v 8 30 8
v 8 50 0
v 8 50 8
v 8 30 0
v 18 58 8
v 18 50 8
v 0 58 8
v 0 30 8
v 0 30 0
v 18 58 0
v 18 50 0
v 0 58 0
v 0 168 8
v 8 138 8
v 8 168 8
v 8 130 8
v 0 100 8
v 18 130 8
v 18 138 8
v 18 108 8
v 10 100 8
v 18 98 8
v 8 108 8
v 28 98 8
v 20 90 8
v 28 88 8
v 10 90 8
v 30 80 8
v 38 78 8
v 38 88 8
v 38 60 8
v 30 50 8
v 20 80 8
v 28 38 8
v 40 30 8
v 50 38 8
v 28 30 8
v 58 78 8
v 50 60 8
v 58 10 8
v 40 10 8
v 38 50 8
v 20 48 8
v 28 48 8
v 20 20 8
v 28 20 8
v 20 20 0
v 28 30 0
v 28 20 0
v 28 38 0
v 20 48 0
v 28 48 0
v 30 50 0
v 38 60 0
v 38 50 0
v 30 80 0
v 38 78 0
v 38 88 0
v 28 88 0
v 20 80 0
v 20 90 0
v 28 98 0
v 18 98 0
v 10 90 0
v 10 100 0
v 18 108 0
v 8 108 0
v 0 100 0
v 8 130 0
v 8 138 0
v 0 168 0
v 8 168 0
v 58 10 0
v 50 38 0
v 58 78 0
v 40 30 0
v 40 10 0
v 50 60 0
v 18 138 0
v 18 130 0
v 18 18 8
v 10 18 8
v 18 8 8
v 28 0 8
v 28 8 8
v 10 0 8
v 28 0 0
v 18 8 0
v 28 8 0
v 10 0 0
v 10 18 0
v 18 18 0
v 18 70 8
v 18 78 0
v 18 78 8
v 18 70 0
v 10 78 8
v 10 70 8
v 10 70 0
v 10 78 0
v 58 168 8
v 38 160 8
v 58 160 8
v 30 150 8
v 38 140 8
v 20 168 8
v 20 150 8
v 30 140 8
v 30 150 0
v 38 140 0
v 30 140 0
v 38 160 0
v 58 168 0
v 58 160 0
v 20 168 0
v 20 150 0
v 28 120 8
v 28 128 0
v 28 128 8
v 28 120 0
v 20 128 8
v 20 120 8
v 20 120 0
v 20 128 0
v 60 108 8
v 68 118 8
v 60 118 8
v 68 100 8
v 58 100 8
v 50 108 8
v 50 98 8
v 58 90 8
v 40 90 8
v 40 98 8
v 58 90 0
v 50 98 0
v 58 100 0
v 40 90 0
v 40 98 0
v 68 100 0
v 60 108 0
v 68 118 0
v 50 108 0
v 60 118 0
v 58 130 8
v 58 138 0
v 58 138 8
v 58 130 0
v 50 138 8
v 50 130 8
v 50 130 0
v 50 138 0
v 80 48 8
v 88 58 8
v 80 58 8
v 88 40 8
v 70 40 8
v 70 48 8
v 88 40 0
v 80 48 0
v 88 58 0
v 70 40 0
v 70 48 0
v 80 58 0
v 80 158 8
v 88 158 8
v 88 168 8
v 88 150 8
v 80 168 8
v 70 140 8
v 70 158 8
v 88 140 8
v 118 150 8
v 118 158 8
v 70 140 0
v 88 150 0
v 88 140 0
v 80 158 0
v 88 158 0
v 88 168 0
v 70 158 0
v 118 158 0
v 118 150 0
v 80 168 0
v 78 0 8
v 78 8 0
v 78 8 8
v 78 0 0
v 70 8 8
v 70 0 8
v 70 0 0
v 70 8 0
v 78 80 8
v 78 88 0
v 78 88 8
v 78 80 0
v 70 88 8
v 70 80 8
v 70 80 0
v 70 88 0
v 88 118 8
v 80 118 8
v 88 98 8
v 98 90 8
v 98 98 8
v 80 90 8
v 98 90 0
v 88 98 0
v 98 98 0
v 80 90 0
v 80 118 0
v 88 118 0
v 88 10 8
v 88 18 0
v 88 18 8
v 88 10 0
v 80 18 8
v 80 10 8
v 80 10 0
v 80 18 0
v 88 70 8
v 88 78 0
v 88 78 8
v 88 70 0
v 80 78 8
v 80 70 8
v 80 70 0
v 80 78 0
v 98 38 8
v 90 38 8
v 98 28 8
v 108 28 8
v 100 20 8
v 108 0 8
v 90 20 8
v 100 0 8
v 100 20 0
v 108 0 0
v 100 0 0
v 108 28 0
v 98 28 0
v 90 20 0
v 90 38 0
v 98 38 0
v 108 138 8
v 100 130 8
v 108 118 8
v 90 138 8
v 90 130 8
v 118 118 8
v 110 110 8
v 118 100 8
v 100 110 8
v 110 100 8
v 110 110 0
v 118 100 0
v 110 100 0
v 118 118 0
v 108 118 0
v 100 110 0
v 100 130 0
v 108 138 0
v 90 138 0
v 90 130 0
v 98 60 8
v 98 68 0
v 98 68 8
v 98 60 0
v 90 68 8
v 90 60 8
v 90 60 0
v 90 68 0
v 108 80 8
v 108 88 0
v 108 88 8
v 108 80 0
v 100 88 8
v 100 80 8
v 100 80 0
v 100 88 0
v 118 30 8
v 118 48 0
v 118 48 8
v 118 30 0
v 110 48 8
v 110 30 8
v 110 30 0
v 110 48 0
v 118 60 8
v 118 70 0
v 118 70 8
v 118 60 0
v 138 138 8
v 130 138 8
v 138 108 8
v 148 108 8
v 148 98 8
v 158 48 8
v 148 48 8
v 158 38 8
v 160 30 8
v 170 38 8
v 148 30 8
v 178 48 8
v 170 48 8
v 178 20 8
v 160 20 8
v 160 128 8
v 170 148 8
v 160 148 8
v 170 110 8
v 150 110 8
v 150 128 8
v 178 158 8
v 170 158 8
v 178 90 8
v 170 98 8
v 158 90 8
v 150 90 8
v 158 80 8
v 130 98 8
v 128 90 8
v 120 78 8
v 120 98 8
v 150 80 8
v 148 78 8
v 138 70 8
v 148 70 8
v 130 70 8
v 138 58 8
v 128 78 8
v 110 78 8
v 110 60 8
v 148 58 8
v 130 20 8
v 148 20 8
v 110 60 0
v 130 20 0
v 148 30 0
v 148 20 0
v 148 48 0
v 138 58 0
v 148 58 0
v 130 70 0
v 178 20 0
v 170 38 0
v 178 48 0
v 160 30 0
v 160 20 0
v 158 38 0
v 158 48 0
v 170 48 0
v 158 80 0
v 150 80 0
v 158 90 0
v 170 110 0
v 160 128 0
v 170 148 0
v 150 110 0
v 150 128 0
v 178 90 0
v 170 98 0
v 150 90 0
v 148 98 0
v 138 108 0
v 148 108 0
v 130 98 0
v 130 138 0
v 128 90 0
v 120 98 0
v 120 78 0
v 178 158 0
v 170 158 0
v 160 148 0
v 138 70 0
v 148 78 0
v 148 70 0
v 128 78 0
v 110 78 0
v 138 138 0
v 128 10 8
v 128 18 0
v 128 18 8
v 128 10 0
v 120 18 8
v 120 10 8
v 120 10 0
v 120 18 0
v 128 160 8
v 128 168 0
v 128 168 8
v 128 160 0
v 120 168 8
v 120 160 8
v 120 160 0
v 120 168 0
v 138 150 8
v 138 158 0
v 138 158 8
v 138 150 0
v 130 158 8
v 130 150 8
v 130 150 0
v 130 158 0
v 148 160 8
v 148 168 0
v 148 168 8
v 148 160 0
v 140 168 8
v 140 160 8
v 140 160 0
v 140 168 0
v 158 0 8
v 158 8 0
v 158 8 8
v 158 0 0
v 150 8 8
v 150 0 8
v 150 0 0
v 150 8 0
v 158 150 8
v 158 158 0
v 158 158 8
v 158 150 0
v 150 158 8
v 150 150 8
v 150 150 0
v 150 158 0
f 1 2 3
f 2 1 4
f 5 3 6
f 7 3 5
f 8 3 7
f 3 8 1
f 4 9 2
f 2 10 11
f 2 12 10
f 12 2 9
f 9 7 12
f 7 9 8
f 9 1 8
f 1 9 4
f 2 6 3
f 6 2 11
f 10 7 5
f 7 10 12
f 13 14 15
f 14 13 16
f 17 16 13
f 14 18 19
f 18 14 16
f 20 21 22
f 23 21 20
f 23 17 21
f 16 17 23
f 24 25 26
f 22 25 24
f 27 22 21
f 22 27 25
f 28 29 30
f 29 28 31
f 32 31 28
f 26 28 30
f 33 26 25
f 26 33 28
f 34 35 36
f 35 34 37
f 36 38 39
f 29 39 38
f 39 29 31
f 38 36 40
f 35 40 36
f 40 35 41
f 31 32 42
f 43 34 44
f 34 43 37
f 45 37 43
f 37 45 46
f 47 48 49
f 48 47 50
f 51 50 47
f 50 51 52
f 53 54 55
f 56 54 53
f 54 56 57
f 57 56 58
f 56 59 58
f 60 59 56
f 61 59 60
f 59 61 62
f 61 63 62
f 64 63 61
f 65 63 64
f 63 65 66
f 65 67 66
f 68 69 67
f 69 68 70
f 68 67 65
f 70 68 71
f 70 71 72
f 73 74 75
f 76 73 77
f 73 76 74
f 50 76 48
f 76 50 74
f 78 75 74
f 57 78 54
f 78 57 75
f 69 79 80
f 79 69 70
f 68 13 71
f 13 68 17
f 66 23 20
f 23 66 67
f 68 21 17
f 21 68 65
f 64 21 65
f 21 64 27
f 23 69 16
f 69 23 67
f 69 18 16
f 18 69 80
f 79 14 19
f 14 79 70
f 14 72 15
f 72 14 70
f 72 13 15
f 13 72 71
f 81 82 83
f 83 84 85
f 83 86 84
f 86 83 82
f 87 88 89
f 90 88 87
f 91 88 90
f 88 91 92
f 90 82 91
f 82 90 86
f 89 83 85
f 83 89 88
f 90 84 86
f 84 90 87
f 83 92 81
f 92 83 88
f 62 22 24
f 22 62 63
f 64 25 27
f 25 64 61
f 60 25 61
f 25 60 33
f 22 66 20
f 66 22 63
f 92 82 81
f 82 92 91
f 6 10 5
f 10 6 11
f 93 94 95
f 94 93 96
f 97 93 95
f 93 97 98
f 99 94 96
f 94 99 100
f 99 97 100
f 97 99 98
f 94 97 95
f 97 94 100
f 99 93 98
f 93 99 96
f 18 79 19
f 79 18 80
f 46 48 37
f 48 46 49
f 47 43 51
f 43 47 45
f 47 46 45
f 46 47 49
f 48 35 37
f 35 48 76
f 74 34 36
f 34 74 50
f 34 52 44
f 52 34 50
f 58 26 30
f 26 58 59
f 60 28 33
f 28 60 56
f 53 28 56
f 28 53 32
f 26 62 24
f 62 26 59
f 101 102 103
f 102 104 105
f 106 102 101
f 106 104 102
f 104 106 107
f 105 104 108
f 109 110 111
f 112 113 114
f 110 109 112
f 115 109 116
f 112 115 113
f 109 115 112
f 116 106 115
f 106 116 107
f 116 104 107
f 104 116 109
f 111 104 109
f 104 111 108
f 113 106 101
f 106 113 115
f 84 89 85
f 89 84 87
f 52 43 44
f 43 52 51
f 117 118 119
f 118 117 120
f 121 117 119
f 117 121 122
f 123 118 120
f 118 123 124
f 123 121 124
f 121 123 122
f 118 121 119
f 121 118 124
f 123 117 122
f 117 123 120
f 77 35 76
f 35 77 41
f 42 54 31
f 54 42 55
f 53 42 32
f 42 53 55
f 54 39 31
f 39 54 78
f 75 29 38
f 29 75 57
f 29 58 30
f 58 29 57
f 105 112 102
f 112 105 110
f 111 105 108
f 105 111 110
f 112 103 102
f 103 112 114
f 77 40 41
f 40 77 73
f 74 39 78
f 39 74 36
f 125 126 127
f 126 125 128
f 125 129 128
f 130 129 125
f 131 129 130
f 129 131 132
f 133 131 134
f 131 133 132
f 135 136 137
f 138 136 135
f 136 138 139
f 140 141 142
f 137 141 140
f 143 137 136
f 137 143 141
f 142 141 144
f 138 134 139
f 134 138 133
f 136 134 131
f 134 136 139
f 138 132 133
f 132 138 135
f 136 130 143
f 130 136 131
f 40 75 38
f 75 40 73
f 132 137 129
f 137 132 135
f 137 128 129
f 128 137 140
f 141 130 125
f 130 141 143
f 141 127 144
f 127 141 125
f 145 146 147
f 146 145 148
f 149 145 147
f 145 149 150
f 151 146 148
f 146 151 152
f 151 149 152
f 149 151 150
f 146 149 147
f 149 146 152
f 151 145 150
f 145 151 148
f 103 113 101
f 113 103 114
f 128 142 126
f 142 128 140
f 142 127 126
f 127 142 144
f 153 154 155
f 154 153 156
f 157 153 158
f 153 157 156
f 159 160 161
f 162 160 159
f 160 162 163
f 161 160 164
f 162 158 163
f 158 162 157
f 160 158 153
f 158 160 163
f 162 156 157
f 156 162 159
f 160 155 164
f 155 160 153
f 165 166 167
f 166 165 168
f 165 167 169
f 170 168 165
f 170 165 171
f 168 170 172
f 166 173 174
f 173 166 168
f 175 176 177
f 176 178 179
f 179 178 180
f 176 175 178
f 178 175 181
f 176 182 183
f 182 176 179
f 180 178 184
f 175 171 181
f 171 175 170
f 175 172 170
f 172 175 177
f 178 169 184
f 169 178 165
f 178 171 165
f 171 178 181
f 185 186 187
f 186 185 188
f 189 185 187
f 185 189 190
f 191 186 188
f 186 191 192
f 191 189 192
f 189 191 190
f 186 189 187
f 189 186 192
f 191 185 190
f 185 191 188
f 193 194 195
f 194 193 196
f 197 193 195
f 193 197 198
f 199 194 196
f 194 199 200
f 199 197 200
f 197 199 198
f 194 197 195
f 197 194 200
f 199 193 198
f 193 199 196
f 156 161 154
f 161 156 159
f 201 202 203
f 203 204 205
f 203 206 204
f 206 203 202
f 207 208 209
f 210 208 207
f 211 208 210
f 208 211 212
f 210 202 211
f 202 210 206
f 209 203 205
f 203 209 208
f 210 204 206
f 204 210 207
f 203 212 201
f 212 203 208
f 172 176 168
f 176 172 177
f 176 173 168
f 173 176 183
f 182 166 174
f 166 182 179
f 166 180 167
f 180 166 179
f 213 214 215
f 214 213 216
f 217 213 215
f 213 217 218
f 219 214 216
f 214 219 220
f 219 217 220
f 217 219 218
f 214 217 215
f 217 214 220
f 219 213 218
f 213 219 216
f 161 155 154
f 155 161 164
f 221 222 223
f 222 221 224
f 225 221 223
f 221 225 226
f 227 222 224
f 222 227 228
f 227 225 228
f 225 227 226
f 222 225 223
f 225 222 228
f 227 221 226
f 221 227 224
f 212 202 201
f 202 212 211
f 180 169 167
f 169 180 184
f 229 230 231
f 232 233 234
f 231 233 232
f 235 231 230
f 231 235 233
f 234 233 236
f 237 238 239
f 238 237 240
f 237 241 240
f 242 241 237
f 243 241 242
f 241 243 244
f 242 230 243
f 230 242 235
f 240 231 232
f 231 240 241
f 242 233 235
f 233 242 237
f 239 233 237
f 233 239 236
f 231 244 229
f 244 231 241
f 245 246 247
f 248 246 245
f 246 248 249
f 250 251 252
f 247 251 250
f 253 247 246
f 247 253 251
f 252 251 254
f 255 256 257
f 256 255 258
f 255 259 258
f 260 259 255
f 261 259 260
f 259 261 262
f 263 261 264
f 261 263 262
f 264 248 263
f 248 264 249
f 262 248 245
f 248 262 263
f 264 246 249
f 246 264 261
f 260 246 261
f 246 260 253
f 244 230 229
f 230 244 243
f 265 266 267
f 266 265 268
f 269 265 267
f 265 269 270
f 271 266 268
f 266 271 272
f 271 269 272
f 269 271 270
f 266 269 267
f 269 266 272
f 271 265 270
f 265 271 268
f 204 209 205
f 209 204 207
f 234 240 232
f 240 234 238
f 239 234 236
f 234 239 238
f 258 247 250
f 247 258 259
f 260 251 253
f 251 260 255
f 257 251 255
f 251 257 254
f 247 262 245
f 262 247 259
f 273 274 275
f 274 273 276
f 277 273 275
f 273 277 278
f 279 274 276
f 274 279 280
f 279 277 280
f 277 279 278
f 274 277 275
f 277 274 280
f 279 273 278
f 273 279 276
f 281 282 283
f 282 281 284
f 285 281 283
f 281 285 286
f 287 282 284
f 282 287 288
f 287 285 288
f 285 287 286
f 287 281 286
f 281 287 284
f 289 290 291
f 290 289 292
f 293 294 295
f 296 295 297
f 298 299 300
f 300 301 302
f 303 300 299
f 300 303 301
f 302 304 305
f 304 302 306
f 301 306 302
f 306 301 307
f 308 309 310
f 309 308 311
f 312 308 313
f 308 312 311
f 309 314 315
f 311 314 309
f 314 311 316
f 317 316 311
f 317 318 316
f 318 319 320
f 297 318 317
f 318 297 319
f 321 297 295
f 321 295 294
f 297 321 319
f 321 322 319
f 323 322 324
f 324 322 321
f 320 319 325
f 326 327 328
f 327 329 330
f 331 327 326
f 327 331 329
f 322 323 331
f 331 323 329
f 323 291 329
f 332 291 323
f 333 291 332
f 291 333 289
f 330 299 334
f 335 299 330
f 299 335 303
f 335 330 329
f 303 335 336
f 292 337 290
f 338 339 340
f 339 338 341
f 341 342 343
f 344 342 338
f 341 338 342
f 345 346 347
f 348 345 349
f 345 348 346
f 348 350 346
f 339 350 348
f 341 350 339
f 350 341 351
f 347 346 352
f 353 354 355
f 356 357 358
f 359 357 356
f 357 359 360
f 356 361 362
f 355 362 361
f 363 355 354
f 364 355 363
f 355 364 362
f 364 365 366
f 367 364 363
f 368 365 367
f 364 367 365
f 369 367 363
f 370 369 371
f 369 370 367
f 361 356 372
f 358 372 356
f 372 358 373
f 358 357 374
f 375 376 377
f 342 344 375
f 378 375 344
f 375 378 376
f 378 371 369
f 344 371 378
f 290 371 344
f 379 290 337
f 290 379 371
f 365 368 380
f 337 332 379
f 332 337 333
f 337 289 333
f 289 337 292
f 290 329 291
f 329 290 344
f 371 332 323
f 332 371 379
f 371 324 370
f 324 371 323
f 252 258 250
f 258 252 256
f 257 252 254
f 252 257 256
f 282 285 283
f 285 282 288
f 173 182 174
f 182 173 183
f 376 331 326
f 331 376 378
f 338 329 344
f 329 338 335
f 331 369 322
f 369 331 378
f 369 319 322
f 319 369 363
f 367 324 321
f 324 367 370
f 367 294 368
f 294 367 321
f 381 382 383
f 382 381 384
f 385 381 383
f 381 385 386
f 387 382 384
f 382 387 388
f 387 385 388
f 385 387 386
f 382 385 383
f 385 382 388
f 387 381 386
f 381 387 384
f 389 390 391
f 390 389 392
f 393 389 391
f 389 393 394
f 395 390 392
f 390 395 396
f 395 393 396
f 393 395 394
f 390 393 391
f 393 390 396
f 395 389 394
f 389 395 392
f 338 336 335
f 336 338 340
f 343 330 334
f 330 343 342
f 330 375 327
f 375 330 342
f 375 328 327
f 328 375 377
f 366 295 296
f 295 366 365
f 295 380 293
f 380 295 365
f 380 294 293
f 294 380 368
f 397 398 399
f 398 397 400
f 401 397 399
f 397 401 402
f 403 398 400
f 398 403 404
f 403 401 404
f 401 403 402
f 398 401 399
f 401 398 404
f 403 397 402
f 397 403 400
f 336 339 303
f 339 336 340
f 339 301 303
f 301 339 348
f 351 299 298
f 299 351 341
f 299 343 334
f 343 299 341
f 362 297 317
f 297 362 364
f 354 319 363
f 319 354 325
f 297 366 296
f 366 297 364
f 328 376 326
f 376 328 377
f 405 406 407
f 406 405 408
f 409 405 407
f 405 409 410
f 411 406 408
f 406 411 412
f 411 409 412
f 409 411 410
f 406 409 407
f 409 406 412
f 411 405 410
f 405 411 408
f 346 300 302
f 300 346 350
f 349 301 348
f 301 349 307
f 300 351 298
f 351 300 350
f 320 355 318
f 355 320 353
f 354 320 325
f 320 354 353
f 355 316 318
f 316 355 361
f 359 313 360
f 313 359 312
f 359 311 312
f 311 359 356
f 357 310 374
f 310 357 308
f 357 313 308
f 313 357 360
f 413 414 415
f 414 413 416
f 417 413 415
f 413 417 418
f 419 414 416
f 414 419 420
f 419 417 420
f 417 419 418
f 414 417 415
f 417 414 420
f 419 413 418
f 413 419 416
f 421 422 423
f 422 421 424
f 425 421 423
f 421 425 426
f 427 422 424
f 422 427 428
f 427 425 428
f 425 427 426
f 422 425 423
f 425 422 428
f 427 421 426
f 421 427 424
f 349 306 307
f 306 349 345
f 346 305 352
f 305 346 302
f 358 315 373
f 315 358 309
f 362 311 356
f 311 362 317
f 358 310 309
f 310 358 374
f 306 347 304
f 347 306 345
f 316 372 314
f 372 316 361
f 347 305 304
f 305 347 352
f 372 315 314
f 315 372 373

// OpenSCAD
width = 17;
height = 17;
is_filled = rands(0.0, 1.0, width * height);
cube_size = 8;
grid_size = 10;

for(x = [0:width]) {
	for(y = [0:height]) {
		if(is_filled[x + y * width] >= 0.5) {
			translate([x * grid_size, y * grid_size, 0]) {
				cube(cube_size);
				if(x < width && is_filled[x + 1 + y * width] >= 0.5) { //Check right.
					translate([cube_size, 0, 0]) {
						cube([grid_size - cube_size, cube_size, cube_size]);
					}
				}
				if(y < height && is_filled[x + (y + 1) * width] >= 0.5) { //Check above.
					translate([0, cube_size, 0]) {
						cube([cube_size, grid_size - cube_size, cube_size]);
					}
				}
				if(x < width && is_filled[x + 1 + y * width] >= 0.5 && y < height && is_filled[x + (y + 1) * width] >= 0.5 && is_filled[x + 1 + (y + 1) * width] >= 0.5) { //Check both.
					translate([cube_size, cube_size, 0]) {
						cube([grid_size - cube_size, grid_size - cube_size, cube_size]);
					}
				}
			}
		}
	}
}
